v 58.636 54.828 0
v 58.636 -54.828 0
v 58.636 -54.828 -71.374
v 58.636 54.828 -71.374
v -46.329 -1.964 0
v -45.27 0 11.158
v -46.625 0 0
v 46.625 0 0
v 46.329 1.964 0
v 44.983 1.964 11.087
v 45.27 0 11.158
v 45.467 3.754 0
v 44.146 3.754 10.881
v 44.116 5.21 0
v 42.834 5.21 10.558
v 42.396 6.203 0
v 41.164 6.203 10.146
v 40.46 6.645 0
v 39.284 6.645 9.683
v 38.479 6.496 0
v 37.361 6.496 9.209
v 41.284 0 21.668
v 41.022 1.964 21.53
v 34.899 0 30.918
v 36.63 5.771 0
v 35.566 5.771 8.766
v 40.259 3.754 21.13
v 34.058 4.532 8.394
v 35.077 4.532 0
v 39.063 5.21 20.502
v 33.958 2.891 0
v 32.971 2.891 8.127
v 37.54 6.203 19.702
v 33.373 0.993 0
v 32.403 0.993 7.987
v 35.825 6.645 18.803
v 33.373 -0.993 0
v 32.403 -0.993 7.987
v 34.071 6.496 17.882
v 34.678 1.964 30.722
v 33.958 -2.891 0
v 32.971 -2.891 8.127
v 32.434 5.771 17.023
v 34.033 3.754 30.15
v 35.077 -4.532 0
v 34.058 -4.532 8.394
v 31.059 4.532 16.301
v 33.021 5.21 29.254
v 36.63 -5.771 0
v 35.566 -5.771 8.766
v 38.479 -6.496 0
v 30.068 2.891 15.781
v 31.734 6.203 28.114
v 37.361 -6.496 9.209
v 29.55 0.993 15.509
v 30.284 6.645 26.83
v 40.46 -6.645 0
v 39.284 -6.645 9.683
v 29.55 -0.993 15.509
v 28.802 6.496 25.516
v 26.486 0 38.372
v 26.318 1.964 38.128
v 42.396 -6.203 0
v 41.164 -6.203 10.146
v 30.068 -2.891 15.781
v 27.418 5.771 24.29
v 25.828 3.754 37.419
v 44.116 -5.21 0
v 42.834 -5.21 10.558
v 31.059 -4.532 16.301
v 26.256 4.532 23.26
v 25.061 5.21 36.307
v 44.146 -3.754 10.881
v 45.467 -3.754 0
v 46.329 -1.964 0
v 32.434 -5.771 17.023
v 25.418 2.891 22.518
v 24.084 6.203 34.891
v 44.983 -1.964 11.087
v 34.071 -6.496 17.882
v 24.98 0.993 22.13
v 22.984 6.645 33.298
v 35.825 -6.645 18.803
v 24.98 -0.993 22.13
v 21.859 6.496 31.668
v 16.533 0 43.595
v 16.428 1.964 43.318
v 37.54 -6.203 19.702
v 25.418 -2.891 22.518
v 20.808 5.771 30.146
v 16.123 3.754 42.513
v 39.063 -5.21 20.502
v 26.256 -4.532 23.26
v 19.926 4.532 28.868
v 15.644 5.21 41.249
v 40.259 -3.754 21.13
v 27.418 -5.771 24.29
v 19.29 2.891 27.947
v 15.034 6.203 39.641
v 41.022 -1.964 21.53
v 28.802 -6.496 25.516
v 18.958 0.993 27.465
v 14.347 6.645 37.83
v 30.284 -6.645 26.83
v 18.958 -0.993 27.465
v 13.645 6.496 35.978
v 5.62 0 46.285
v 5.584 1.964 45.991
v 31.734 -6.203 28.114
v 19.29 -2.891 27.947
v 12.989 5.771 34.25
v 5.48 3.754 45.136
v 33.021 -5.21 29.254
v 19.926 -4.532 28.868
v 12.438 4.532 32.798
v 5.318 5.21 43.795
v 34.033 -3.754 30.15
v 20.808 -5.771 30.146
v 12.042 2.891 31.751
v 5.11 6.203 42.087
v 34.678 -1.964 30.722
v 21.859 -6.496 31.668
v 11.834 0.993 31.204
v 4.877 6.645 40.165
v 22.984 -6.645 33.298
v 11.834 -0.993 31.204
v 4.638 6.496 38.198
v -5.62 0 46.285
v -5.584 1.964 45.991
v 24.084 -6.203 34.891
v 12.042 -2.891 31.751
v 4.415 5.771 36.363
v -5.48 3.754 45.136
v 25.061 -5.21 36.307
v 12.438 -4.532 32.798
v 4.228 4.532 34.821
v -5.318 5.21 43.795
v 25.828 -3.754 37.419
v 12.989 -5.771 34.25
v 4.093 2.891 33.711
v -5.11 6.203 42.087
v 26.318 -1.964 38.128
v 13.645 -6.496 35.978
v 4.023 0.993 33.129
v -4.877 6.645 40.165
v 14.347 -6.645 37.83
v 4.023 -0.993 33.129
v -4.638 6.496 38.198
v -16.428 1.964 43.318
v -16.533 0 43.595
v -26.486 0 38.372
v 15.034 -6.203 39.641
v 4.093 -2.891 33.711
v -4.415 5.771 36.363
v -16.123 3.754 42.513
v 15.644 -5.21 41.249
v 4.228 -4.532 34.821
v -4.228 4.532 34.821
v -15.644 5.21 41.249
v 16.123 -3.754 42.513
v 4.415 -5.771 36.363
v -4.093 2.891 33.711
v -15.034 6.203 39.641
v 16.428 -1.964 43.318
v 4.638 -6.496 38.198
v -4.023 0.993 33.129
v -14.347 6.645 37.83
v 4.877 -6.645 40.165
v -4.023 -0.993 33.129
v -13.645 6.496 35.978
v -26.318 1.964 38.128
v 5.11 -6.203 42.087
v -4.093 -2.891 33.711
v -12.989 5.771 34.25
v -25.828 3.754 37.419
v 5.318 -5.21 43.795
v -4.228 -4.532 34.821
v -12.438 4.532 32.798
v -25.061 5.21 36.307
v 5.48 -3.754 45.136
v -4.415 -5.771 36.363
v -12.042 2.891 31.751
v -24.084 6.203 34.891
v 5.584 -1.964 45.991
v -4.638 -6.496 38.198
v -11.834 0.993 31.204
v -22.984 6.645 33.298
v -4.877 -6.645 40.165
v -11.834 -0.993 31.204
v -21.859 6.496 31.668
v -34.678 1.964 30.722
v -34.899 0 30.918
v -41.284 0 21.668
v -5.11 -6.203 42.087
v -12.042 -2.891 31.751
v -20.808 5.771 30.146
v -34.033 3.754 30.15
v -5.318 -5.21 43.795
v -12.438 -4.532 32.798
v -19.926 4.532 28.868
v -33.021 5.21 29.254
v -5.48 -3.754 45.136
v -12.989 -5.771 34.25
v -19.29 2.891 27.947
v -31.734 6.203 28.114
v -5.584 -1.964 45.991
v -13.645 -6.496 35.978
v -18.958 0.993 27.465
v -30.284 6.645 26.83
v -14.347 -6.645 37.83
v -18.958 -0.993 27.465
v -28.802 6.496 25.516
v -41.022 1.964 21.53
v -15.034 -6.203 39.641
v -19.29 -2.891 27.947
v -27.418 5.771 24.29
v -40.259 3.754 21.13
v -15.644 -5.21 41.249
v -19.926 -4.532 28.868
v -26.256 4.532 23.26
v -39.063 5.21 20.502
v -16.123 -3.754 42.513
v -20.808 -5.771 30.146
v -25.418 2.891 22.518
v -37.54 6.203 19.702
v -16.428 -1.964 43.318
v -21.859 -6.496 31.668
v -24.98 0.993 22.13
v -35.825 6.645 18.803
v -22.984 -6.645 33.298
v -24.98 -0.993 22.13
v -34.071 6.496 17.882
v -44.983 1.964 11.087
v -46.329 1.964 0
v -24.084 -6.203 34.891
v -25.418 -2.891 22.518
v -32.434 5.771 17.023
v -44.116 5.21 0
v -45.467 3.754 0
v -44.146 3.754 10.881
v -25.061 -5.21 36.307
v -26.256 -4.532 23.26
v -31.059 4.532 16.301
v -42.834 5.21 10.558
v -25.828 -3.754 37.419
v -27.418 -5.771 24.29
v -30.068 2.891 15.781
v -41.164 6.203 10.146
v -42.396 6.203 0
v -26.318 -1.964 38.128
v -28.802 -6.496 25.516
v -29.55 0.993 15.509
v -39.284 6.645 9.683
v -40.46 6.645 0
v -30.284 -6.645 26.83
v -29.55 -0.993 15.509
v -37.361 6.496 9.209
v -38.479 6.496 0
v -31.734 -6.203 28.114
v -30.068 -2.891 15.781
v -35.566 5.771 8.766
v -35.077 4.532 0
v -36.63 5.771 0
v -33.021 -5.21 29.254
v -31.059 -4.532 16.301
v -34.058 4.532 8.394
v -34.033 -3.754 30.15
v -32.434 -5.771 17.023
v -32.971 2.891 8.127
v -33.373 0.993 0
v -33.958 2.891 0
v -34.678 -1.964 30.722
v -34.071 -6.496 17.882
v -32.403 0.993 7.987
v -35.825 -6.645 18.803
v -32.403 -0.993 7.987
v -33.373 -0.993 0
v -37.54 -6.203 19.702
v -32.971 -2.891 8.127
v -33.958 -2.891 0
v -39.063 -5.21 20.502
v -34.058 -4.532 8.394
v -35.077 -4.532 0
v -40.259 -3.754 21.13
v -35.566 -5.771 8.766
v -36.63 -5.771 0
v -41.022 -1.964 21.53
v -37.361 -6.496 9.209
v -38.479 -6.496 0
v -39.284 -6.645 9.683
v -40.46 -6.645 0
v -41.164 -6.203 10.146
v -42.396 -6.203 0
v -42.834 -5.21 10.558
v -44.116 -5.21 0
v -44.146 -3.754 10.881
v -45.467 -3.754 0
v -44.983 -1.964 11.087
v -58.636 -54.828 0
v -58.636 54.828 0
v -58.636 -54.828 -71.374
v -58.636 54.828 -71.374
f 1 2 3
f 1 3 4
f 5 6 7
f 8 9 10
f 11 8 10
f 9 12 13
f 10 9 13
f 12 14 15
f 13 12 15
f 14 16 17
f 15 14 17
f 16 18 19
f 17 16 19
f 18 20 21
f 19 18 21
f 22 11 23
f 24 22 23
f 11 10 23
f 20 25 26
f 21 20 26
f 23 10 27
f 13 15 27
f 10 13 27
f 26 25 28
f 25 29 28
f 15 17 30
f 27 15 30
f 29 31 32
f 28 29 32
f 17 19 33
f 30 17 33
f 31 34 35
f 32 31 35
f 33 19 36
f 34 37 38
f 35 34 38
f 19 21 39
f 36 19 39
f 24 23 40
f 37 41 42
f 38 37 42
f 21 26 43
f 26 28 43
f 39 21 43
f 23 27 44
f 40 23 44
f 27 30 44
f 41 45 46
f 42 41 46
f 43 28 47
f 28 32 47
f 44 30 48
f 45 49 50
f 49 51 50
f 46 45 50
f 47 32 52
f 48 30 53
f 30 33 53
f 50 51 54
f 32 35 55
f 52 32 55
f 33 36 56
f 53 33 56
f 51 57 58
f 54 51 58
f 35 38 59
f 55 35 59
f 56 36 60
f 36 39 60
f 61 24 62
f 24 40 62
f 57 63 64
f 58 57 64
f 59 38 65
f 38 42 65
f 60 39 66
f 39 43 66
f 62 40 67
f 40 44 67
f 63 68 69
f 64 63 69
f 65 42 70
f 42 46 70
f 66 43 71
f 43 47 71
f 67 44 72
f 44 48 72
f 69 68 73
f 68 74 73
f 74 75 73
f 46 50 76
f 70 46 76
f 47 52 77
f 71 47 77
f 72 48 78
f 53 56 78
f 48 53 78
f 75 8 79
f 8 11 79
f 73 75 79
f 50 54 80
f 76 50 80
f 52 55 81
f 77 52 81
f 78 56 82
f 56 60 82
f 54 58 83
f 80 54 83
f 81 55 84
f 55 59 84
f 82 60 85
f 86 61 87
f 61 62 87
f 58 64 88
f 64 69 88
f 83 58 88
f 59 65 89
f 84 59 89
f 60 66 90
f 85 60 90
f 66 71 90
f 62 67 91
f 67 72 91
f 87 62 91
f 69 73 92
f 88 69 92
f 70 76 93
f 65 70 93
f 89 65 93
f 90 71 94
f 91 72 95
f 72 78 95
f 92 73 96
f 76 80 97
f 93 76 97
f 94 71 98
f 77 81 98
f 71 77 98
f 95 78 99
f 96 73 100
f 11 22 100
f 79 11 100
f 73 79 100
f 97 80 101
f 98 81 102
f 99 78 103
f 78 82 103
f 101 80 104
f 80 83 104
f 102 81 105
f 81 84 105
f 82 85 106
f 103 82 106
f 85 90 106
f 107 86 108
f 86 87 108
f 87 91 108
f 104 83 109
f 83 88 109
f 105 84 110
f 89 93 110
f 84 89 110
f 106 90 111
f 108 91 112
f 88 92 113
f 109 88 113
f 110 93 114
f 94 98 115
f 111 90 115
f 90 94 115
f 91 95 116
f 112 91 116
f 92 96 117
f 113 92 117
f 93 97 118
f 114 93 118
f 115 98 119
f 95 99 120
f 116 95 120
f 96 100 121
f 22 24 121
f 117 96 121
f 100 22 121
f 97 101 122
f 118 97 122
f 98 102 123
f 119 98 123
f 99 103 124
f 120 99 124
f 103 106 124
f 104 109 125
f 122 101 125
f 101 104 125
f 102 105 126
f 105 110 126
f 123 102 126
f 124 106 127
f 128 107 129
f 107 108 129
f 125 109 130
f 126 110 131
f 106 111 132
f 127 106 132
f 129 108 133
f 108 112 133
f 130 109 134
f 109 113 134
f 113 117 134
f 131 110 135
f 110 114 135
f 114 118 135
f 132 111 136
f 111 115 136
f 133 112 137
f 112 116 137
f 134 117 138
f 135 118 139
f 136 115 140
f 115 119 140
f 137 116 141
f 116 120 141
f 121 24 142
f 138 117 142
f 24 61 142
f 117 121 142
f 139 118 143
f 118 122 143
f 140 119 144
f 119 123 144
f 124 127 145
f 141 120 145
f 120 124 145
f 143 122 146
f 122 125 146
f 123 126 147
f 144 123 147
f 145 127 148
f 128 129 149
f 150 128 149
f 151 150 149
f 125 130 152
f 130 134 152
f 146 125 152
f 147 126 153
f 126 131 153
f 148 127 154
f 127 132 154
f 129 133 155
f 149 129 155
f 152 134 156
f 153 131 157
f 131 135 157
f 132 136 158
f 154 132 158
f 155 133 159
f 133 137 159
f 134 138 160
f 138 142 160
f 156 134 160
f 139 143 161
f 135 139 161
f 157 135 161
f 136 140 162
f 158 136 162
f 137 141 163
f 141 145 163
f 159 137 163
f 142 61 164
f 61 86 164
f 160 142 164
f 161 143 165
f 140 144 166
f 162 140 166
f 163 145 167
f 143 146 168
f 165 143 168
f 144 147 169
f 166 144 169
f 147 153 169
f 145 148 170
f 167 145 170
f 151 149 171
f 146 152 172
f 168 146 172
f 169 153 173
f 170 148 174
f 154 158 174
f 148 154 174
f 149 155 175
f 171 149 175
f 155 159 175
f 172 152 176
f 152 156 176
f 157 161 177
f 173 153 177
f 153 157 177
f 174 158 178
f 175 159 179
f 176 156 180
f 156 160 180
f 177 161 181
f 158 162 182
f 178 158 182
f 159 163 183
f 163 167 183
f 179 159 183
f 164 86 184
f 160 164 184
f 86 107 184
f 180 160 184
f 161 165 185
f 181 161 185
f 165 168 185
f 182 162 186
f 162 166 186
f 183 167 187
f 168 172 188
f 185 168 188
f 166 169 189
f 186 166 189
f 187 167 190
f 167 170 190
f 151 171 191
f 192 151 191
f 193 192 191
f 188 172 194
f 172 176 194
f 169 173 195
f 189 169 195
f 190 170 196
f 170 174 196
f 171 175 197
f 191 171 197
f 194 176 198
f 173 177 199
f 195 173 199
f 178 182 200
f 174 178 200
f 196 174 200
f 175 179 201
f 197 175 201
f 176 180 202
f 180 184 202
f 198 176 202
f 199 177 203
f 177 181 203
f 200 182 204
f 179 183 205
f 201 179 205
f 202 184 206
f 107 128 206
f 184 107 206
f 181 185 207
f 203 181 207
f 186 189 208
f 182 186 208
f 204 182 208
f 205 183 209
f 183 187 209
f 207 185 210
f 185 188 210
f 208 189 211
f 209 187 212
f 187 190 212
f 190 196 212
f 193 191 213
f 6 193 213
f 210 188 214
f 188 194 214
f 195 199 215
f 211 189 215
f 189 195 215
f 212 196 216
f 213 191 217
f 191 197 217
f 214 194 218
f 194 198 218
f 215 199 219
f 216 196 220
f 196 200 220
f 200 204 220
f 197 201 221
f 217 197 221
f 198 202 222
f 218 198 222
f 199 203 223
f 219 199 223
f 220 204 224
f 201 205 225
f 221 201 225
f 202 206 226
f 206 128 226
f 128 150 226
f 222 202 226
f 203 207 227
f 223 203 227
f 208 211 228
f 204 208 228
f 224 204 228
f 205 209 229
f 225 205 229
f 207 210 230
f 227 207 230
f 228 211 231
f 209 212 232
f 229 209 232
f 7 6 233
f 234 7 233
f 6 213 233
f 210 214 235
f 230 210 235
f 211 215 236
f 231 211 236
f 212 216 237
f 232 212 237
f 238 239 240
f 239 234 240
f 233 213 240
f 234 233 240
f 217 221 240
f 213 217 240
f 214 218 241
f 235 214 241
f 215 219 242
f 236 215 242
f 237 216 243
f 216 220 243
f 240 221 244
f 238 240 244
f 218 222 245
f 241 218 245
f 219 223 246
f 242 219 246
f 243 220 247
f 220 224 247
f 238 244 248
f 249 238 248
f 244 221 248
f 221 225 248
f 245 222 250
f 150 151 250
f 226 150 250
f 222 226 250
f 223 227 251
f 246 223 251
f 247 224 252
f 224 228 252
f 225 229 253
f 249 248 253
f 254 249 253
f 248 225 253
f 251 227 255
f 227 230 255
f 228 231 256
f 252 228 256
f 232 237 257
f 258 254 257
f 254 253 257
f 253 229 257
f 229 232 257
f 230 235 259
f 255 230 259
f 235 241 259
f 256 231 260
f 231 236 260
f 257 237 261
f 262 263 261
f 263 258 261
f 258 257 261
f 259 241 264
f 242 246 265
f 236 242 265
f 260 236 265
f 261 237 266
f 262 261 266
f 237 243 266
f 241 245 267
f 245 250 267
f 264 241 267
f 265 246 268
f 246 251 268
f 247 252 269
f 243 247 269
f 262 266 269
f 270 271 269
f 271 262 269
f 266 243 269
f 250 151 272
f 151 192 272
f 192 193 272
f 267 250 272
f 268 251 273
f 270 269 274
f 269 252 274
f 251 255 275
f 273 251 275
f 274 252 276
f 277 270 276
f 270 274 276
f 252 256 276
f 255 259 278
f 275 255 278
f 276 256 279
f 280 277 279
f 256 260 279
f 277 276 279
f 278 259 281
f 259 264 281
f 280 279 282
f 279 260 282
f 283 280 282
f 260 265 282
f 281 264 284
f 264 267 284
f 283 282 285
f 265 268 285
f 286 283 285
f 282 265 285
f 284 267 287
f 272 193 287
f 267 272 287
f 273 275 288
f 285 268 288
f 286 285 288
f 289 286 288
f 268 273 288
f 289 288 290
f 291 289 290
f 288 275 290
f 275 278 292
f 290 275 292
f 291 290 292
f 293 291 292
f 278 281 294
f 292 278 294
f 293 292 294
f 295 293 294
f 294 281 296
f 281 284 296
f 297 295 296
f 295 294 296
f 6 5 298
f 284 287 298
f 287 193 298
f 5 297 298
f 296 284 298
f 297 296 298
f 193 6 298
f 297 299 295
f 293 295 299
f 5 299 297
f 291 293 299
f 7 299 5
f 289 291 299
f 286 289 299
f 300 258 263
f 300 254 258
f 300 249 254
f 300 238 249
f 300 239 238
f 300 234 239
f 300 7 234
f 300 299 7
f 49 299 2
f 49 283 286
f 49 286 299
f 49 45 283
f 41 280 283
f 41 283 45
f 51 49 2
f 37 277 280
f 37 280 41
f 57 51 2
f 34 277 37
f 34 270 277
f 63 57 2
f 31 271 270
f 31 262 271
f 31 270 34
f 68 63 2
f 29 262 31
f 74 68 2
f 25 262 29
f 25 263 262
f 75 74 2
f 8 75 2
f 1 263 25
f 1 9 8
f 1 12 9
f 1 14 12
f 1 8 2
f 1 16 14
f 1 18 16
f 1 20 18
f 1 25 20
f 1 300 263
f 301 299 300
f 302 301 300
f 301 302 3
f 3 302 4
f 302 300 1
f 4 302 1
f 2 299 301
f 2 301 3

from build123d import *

# Parameters (mm, degrees)
F0_W     = 117.271182
F0_H     = 109.656172
F2_DEPTH = 71.374
F1_R     = 6.663407


with BuildPart() as f2:
    # F0 (on Top) → F2 (new body)
    with BuildSketch(Plane.XY):
        Rectangle(F0_W, F0_H)
    extrude(amount=-F2_DEPTH)

    # F1 (on Top) → F4 (revolve)
    with BuildSketch(Plane.XY):
        with Locations((39.96164, 0)):
            Circle(F1_R)
    revolve(axis=Axis((0, -0.142617, 0), (0, -1, 0)))


solid = f2.part
